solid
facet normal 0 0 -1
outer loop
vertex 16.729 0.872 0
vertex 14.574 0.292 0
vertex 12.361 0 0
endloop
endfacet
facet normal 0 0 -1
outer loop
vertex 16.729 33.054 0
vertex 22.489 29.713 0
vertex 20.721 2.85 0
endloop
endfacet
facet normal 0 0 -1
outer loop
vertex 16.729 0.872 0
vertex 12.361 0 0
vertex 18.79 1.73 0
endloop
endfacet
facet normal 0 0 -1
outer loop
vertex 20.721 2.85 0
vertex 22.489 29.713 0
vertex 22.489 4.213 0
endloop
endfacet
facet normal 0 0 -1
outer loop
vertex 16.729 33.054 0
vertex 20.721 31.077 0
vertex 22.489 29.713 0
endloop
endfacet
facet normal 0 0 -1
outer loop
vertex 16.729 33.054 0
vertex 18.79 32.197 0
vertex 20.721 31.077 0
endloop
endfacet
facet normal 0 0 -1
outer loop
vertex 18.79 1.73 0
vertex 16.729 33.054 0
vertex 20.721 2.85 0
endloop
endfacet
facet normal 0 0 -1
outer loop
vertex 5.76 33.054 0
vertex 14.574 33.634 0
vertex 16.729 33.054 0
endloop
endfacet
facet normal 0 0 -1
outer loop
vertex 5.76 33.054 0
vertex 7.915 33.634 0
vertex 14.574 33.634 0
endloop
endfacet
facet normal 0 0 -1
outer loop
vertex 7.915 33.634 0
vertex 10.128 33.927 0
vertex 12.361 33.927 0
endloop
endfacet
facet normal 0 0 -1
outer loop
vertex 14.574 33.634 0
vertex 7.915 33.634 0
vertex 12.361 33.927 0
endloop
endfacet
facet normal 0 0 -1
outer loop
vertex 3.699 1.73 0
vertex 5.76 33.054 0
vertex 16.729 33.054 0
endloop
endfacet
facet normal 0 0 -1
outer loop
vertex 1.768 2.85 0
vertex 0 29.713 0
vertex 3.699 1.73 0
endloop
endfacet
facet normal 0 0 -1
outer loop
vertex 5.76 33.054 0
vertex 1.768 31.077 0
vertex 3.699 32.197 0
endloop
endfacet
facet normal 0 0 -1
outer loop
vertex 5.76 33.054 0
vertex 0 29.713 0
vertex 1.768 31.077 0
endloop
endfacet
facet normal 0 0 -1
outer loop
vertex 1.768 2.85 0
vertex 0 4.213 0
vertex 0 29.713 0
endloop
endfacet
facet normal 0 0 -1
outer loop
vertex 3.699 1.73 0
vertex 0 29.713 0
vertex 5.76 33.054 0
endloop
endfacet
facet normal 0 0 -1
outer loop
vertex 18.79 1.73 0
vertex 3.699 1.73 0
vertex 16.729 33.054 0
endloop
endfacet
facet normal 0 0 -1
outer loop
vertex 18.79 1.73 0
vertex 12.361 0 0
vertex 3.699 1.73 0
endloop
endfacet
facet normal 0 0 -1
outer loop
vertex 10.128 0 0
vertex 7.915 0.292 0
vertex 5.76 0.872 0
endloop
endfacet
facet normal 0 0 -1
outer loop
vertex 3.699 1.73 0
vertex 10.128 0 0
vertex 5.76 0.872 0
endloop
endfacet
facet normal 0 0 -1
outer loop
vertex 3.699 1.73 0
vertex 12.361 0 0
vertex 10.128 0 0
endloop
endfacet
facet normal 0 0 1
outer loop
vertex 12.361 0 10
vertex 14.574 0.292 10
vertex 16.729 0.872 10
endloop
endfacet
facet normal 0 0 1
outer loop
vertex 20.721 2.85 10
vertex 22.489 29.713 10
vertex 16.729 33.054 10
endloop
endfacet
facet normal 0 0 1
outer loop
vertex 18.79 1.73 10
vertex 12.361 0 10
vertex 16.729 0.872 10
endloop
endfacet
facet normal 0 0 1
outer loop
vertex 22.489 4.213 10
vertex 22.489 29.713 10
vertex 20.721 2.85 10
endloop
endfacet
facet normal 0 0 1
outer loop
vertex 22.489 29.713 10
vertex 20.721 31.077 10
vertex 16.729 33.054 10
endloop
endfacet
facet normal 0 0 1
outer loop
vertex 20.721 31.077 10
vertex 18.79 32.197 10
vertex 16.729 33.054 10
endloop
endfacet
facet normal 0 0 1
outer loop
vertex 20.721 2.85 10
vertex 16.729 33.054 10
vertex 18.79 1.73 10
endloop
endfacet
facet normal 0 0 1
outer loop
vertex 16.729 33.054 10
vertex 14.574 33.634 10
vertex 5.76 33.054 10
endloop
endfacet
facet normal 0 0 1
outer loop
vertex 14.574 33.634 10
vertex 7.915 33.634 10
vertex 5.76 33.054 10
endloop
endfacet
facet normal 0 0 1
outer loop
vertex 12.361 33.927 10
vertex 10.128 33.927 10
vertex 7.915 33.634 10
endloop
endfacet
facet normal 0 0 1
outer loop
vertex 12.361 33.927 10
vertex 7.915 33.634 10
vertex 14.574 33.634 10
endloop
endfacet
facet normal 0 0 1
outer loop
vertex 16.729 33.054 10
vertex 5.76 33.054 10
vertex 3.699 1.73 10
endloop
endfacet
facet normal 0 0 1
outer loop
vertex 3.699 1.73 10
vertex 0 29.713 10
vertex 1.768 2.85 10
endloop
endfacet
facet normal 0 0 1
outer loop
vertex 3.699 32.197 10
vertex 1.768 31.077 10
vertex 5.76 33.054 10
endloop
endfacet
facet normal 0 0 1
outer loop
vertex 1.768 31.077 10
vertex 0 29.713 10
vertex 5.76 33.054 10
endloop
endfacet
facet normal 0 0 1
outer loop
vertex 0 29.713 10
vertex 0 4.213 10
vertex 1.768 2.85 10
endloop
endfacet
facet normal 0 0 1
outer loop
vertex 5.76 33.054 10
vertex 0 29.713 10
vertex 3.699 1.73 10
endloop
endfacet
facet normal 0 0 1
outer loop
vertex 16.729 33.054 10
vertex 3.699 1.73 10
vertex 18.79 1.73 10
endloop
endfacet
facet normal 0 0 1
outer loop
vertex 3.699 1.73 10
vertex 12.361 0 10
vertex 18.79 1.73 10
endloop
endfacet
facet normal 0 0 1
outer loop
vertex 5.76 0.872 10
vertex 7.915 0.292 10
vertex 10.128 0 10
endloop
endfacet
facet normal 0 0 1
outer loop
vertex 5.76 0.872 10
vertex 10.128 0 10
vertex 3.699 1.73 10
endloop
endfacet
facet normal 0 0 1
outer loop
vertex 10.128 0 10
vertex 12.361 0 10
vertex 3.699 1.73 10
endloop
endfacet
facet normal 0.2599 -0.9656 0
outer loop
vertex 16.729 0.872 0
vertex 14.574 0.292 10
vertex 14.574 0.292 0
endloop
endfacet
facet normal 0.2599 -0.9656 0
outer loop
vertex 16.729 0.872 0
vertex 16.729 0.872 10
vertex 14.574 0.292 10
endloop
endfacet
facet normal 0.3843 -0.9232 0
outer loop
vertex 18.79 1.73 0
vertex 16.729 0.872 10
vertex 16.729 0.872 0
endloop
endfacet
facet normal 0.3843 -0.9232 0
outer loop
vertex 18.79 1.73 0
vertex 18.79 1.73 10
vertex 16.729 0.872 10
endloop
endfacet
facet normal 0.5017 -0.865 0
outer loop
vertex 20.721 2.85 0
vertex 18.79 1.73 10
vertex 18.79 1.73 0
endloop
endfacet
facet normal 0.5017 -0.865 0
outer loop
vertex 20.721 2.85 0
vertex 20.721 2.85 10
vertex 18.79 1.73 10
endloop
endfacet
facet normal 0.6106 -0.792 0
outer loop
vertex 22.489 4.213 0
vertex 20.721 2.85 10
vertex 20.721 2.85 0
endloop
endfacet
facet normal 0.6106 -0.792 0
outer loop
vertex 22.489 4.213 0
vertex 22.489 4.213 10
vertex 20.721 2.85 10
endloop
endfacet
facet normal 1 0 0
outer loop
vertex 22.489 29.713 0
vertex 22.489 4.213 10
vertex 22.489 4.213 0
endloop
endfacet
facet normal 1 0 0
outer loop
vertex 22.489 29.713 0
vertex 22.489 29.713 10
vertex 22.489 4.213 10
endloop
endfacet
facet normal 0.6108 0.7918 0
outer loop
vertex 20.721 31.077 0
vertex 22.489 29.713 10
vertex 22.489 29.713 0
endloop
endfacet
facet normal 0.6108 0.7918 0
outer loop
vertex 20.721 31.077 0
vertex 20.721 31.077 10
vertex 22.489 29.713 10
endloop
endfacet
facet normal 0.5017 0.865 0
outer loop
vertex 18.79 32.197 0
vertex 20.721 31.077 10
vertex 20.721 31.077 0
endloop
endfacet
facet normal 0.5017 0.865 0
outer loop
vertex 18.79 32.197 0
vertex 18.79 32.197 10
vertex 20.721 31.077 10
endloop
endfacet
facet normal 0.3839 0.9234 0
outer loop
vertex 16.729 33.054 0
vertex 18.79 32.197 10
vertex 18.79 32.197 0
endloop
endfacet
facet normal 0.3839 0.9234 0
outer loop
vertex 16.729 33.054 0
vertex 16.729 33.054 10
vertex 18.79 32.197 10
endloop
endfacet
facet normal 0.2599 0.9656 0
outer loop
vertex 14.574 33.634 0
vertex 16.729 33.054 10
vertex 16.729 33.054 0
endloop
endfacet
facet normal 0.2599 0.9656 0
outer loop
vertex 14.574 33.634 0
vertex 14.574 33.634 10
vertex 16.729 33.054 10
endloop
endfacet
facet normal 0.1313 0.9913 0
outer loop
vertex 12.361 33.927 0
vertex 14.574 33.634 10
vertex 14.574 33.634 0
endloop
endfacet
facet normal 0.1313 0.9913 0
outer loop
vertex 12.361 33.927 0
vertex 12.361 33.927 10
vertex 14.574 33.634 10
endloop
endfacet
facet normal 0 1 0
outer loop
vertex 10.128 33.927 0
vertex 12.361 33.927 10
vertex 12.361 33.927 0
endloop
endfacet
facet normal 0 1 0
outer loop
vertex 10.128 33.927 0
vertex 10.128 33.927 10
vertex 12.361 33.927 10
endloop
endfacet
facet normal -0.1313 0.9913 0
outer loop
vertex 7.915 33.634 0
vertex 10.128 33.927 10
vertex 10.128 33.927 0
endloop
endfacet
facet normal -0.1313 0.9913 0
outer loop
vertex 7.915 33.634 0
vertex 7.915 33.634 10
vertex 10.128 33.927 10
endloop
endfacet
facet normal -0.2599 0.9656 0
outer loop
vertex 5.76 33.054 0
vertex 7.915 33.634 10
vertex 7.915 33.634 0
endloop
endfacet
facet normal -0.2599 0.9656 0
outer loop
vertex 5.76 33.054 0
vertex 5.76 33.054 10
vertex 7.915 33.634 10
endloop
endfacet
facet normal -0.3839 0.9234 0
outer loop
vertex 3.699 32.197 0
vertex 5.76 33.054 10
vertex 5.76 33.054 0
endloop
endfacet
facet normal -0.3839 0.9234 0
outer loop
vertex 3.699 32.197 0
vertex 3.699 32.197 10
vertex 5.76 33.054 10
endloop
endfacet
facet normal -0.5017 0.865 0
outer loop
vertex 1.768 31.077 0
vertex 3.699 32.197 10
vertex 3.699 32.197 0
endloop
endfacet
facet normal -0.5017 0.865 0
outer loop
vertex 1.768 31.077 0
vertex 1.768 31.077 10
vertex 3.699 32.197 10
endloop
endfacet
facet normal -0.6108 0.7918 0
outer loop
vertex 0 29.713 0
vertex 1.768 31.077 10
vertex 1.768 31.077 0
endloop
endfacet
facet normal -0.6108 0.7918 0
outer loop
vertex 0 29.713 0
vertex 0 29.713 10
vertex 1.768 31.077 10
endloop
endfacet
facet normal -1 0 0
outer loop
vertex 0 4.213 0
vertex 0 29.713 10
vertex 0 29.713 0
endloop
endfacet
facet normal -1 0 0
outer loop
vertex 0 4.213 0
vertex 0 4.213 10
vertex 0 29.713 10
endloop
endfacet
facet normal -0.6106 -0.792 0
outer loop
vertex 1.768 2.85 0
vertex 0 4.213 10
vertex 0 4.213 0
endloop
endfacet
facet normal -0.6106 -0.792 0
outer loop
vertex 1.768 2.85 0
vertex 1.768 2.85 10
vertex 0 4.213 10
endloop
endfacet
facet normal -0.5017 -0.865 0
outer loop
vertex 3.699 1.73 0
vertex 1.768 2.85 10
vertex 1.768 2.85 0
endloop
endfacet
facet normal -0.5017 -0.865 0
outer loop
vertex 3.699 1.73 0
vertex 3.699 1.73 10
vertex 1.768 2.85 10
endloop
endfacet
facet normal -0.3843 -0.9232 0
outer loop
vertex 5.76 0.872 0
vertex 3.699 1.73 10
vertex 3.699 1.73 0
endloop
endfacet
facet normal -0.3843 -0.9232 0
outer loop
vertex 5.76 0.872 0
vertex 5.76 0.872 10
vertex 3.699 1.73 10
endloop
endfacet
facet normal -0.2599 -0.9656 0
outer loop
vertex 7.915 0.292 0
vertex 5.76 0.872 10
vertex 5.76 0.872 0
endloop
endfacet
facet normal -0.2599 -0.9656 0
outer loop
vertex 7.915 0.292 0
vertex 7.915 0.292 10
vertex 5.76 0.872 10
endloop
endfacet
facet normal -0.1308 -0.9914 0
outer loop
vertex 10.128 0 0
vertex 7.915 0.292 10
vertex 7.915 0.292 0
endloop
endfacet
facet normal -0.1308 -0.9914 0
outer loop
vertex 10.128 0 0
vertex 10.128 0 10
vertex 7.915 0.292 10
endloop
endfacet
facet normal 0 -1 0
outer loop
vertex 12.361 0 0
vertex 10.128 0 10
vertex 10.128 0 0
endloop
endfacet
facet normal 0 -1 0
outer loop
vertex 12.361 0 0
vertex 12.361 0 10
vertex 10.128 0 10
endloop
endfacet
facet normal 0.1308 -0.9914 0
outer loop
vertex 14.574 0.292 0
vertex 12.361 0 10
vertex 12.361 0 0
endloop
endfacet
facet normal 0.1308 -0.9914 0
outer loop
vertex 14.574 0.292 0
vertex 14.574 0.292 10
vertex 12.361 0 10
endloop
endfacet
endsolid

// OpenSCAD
$fn = 32;

// ----------------------------------------------------------------------
// Eccentric disc: double_d, 10 mm thick
// ----------------------------------------------------------------------

// --- parameters (mm) ---
profile_height = 10;      // extrusion height
profile_points = 24;      // points of the closed outline

profile = [[22.489, 29.713], [20.721, 31.077], [18.79, 32.197], [16.729, 33.054], [14.574, 33.634], [12.361, 33.927], [10.128, 33.927], [7.915, 33.634], [5.76, 33.054], [3.699, 32.197], [1.768, 31.077], [0, 29.713], [0, 4.213], [1.768, 2.85], [3.699, 1.73], [5.76, 0.872], [7.915, 0.292], [10.128, 0], [12.361, 0], [14.574, 0.292], [16.729, 0.872], [18.79, 1.73], [20.721, 2.85], [22.489, 4.213]];  // single closed polygon, 24 points, counter clockwise

// --- the one profile operation ---
linear_extrude(height = profile_height) polygon(points = profile);
